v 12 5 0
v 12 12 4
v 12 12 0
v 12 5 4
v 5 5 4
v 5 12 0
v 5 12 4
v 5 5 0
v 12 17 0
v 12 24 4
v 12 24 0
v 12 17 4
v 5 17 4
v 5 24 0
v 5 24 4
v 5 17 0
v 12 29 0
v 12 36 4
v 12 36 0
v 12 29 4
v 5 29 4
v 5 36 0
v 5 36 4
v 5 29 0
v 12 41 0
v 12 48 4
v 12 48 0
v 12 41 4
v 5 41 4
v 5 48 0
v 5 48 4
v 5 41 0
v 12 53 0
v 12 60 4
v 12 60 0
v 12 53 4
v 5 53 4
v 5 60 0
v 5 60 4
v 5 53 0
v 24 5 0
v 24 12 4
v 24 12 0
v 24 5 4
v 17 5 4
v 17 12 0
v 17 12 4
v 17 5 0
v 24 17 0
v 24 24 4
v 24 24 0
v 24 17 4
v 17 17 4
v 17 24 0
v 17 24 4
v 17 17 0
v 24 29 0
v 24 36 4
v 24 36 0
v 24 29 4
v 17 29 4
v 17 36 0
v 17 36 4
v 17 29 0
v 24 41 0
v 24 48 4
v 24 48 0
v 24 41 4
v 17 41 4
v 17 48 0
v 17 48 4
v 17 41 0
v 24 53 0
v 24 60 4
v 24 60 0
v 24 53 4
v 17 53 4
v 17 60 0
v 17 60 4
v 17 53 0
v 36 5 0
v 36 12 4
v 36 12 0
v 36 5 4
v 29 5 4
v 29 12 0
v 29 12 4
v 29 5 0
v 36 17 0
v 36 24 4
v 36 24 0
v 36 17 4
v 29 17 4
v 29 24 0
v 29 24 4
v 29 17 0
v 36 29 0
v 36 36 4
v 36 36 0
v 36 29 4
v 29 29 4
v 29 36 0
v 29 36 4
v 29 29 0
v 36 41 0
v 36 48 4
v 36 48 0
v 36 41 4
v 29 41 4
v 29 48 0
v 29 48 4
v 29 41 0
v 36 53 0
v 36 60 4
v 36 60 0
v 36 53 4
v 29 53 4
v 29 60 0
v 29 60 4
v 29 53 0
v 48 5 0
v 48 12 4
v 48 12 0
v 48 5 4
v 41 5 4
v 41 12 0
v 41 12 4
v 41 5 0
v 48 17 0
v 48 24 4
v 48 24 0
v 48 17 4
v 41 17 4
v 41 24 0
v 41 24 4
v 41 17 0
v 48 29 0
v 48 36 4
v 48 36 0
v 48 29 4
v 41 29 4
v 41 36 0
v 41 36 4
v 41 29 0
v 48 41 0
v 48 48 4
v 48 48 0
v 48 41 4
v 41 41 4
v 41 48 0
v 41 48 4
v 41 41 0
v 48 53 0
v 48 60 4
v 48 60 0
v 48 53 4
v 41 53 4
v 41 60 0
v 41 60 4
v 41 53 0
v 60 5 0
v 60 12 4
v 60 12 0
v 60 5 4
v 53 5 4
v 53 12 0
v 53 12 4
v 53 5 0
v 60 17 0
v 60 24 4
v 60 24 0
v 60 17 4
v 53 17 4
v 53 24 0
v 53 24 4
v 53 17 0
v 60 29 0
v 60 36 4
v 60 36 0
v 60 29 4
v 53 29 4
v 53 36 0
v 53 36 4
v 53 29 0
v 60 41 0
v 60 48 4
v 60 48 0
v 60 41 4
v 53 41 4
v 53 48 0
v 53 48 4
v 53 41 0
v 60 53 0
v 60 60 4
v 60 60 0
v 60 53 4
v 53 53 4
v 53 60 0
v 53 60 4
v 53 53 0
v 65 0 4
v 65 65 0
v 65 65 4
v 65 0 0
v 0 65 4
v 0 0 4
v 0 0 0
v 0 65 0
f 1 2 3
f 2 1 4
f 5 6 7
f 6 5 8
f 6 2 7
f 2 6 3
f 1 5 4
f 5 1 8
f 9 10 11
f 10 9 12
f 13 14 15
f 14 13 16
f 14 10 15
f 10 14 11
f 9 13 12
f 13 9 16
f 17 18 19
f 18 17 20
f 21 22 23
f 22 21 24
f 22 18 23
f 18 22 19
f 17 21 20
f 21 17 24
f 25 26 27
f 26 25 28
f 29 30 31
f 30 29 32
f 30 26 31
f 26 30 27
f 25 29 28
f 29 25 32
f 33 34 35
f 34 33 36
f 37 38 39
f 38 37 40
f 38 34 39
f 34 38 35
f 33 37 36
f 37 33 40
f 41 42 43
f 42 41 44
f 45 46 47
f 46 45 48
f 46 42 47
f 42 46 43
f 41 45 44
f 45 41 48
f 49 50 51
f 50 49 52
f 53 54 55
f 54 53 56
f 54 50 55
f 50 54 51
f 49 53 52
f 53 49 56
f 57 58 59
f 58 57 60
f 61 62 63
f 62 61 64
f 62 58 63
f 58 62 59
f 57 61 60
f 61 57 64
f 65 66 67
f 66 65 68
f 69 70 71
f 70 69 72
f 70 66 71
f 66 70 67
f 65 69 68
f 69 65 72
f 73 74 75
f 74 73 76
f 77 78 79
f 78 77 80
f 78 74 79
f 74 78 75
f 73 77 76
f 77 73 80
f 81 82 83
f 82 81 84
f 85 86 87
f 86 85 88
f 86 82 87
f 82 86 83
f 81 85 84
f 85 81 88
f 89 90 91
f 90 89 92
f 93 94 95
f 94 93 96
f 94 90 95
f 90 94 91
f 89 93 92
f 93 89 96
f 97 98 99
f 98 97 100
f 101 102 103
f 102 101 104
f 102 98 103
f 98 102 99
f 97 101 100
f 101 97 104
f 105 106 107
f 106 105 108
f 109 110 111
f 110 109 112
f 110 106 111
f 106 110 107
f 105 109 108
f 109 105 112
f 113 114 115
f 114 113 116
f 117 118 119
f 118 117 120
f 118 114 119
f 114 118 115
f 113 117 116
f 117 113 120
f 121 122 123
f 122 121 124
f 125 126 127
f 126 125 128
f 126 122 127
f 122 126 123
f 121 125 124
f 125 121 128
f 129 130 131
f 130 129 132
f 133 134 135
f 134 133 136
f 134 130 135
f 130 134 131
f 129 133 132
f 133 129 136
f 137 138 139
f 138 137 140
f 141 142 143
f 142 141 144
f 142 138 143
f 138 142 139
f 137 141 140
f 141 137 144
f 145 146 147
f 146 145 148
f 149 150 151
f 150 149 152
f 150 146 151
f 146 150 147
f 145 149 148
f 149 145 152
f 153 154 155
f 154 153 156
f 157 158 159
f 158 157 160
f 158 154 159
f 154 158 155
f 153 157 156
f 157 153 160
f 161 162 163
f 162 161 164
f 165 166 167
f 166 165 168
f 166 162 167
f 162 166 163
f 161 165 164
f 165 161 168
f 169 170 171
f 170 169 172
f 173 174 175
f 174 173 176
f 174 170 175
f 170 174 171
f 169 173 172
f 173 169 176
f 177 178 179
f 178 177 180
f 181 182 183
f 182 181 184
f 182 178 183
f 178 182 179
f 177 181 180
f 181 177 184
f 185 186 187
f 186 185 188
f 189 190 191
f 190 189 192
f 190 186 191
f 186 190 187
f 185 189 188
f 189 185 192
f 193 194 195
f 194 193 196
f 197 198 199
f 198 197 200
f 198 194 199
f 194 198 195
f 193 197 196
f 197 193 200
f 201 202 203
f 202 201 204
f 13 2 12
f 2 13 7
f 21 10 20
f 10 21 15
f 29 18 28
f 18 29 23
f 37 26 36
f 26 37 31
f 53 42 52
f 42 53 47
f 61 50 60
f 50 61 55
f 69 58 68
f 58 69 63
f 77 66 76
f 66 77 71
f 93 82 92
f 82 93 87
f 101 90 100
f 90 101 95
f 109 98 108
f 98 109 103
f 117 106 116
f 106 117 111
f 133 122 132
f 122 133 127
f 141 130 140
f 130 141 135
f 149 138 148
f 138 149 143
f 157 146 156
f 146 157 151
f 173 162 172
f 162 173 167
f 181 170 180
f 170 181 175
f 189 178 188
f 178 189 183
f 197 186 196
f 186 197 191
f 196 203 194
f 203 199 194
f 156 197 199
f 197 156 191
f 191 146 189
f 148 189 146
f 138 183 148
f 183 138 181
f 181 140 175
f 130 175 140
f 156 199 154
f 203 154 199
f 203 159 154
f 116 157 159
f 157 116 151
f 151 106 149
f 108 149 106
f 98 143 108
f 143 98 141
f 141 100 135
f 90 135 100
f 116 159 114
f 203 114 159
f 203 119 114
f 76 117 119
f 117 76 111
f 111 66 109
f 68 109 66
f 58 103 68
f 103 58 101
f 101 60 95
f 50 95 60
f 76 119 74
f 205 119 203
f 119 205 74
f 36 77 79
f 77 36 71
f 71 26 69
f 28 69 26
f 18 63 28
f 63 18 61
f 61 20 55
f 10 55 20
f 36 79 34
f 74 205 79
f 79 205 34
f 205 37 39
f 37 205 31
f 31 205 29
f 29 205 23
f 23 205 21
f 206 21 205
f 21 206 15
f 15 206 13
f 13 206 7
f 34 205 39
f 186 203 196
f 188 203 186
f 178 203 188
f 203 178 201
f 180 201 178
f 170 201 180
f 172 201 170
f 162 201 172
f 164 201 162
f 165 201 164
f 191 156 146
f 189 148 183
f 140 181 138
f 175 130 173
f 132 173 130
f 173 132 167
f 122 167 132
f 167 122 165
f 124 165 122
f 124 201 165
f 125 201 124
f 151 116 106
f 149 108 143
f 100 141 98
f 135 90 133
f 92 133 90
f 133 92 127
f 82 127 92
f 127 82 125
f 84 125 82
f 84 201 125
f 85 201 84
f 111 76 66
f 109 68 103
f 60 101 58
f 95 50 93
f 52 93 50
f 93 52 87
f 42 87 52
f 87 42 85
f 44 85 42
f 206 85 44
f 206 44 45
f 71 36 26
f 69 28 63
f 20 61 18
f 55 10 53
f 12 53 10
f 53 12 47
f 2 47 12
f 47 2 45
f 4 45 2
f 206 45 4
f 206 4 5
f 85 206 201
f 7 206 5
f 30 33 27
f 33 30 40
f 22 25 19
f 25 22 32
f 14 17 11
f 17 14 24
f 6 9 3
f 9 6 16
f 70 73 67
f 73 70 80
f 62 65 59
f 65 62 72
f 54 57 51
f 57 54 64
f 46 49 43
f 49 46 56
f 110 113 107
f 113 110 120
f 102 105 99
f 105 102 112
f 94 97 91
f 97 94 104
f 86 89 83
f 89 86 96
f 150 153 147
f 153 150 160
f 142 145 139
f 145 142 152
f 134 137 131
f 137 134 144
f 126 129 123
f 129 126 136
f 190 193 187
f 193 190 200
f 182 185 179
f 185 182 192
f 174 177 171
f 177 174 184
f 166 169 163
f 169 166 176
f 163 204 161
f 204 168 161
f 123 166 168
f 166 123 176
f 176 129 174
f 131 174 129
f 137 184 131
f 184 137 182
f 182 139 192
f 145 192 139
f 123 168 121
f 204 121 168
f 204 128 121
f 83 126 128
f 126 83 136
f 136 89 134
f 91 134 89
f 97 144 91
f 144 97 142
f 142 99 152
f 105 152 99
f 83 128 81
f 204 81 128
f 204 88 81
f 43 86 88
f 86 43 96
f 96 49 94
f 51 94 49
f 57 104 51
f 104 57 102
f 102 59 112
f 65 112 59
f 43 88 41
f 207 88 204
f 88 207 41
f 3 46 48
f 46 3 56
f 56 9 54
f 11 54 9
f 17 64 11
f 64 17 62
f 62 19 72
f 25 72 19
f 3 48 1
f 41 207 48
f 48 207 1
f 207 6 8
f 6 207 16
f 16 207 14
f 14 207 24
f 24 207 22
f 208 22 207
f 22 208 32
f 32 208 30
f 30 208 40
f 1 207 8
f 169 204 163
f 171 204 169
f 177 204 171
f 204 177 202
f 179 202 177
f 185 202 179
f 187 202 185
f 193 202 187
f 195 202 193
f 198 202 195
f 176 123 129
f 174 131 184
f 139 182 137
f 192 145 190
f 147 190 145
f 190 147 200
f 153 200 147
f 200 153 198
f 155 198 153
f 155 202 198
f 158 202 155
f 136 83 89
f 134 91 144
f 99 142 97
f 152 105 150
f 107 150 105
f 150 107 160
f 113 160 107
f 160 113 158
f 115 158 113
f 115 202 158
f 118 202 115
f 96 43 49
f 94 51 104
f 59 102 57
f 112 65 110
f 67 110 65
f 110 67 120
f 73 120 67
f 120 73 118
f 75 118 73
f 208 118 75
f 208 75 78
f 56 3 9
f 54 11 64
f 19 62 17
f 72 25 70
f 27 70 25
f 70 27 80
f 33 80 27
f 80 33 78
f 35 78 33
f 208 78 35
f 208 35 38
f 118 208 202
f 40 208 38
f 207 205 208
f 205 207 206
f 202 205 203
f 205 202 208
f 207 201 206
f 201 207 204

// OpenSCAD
GridSize = 7;
GridHeight = 4;
GridsX = 5;
GridsY = 5;

difference(){
    
cube([(GridsY*GridSize)+(GridsY*5)+5, (GridsX*GridSize)+(GridsX*5)+5, GridHeight]);
    
for (i = [1:1:GridsY]) {
 for (j = [1:1:GridsX]){
     translate([((i*GridSize)+i*5)-(GridSize),((j*GridSize)+j*5)-(GridSize), -1])
     cube([GridSize,GridSize,GridHeight+2]);
     }
    };
}
    
